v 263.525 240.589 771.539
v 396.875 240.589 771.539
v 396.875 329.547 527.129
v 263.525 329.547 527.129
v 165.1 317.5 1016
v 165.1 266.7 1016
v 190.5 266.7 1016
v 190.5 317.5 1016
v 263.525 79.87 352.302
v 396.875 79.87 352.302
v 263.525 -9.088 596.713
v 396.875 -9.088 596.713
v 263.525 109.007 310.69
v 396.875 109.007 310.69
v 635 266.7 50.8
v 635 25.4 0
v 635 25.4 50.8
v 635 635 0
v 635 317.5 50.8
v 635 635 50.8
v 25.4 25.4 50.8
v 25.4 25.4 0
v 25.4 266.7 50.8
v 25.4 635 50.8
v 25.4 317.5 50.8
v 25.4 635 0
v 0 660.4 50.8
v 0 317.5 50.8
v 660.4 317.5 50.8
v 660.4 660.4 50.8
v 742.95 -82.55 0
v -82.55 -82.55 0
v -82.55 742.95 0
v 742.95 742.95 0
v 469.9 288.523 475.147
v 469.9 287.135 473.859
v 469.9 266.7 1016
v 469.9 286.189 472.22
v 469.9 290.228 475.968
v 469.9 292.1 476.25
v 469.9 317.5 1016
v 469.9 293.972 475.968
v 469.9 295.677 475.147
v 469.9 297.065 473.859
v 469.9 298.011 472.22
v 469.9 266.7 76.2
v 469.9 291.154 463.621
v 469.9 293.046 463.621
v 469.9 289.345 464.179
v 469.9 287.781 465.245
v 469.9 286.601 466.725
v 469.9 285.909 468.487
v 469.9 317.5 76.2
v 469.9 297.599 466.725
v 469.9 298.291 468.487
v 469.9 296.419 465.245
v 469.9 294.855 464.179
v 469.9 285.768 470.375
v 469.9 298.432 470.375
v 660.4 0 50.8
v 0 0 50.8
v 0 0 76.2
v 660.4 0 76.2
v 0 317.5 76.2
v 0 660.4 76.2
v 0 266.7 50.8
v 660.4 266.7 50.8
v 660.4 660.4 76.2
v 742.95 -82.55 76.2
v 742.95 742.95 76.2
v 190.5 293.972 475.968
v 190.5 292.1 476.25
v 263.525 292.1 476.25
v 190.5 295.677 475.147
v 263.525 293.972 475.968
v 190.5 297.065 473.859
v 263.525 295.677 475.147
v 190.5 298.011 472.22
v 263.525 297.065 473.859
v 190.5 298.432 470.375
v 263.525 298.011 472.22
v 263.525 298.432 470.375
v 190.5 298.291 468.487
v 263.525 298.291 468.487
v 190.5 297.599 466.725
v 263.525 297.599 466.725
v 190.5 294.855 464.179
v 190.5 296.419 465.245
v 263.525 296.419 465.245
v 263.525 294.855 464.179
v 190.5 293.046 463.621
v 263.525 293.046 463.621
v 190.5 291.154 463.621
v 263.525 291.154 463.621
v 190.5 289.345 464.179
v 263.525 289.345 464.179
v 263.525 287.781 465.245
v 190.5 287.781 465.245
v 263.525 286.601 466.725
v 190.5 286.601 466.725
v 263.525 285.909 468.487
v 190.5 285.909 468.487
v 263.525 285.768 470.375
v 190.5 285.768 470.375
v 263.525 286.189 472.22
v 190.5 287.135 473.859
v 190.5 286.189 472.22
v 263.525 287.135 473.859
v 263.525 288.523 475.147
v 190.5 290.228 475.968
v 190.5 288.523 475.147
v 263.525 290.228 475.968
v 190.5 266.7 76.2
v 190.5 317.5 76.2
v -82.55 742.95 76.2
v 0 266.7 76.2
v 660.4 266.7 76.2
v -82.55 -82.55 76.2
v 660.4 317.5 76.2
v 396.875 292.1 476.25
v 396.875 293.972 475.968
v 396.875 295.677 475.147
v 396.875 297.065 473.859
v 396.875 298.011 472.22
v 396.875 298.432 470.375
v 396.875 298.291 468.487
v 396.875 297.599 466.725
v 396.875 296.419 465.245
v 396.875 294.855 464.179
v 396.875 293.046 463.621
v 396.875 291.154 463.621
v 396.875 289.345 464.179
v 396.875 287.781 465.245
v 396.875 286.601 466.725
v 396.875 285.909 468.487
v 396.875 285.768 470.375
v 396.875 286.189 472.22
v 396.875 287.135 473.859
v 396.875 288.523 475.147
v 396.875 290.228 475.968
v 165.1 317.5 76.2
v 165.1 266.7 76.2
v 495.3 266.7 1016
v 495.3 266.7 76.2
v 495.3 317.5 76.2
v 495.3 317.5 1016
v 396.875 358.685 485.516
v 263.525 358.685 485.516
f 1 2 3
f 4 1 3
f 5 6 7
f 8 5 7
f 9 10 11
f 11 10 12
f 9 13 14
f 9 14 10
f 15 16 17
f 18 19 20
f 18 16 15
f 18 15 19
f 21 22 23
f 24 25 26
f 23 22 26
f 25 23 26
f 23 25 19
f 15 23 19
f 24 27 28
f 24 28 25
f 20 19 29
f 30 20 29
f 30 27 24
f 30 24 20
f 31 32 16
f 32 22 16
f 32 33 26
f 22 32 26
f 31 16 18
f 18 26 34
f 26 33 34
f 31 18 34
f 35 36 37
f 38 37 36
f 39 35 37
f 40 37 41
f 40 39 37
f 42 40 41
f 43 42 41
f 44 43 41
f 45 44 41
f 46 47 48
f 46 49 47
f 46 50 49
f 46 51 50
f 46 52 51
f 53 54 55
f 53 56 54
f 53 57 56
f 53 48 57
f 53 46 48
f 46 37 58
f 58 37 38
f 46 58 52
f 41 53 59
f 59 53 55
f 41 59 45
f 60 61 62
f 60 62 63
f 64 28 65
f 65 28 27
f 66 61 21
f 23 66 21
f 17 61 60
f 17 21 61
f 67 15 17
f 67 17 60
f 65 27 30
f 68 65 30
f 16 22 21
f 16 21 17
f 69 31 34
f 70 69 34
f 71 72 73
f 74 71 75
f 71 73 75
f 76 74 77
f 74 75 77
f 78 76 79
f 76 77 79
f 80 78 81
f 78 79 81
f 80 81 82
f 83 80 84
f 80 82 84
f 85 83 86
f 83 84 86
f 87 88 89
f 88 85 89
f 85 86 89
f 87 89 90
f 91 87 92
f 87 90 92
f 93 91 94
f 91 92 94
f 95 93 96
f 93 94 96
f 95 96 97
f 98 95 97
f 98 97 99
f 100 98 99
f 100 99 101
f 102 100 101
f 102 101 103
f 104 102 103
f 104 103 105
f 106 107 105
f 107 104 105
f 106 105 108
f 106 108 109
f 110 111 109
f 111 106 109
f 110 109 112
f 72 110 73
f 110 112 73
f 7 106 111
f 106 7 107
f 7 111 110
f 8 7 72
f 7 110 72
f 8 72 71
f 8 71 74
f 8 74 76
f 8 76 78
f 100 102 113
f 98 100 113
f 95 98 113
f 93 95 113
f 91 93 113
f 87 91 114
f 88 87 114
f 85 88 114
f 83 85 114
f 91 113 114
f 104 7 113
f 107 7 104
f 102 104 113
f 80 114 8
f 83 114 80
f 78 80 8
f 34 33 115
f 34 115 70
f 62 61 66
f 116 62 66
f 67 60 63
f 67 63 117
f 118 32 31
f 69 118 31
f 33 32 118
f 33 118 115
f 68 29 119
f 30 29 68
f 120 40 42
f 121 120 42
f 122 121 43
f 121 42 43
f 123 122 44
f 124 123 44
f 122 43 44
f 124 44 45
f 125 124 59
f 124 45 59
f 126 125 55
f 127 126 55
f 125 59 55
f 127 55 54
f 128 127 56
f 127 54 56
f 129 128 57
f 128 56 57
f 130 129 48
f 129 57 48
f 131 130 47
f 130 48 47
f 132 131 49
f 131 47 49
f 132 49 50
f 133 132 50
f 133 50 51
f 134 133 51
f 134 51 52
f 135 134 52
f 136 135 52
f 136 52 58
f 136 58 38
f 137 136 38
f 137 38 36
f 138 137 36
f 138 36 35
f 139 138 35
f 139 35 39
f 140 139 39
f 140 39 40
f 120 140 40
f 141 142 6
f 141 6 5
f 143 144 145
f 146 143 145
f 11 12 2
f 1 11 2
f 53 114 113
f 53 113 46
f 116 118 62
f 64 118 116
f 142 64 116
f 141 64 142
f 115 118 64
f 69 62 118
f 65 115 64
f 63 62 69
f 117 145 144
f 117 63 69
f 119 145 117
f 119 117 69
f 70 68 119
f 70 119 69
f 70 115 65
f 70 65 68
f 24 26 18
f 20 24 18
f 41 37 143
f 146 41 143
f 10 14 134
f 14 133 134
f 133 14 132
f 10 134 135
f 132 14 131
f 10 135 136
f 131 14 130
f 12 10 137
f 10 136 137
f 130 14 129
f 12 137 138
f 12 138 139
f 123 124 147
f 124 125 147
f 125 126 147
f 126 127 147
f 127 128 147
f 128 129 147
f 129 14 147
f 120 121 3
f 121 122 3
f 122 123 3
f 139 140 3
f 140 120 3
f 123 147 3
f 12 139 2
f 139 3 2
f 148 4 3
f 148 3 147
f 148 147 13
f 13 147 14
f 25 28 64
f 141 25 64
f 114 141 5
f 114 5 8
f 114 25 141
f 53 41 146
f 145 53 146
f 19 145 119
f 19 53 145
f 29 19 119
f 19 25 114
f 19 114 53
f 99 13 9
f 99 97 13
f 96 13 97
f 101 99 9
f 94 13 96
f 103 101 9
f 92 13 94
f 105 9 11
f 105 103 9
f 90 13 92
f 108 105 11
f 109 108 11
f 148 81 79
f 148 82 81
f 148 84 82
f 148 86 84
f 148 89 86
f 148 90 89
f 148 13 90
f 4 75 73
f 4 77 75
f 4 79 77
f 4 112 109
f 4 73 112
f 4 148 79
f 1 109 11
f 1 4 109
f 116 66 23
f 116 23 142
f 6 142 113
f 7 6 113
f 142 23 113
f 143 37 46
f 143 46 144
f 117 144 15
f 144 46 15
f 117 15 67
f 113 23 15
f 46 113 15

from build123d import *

# Parameters (mm, degrees)
SKETCH1_W           = 660.4
SKETCH1_H           = 660.4
SKETCH1_W_2         = 609.6
SKETCH1_H_2         = 609.6
BOSS_EXTRUDE1_DEPTH = 50.8
SKETCH2_W           = 660.4
SKETCH2_H           = 50.8
BOSS_EXTRUDE2_DEPTH = 25.4
SKETCH3_W           = 25.4
SKETCH3_H           = 50.8
BOSS_EXTRUDE3_DEPTH = 939.8
BOSS_EXTRUDE4_START = 73.025
SKETCH4_R           = 6.35
BOSS_EXTRUDE4_DEPTH = 133.35
SKETCH4_2_R         = 6.35
BOSS_EXTRUDE5_DEPTH = 282.956
SKETCH5_W           = 825.5
SKETCH5_H           = 825.5
SKETCH5_W_2         = 660.4
SKETCH5_H_2         = 660.4
BOSS_EXTRUDE6_DEPTH = 76.2


with BuildPart() as part:
    # Sketch1 → Boss-Extrude1 (new body)
    with BuildSketch(Plane.XY):
        with Locations((330.2, 330.2)):
            Rectangle(SKETCH1_W, SKETCH1_H)
        with Locations((330.2, 330.2)):
            Rectangle(SKETCH1_W_2, SKETCH1_H_2, mode=Mode.SUBTRACT)
    extrude(amount=BOSS_EXTRUDE1_DEPTH)

    # Sketch2 → Boss-Extrude2 (add)
    with BuildSketch(Plane.XY.offset(50.8)):
        with Locations((330.2, 292.1)):
            Rectangle(SKETCH2_W, SKETCH2_H)
    extrude(amount=BOSS_EXTRUDE2_DEPTH)

    # Sketch3 → Boss-Extrude3 (add)
    with BuildSketch(Plane.XY.offset(76.2)):
        with Locations((177.8, 292.1)):
            Rectangle(SKETCH3_W, SKETCH3_H)
        with Locations((482.6, 292.1)):
            Rectangle(SKETCH3_W, SKETCH3_H)
    extrude(amount=BOSS_EXTRUDE3_DEPTH)



with BuildPart() as body_2:
    # Sketch4 → Boss-Extrude4 (new body)
    with BuildSketch(Plane.ZY.offset(-469.9).offset(BOSS_EXTRUDE4_START)):
        Polygon((485.515641783, 358.684996296), (310.689543984, 109.007453196), (352.302467833, 79.86977023), (596.712759729, -9.088300969), (771.538857529, 240.589242131), (527.128565633, 329.547313329), align=None)
        with Locations((469.9, 292.1)):
            Circle(SKETCH4_R, mode=Mode.SUBTRACT)
    extrude(amount=BOSS_EXTRUDE4_DEPTH)


with BuildPart() as part_1:
    add(part.part)

    add(body_2.part)  # Boss-Extrude5 merges body 2
    # Sketch4<2> → Boss-Extrude5 (add)
    with BuildSketch(Plane.ZY.offset(-469.9)):
        with Locations((469.9, 292.1)):
            Circle(SKETCH4_2_R)
    extrude(amount=BOSS_EXTRUDE5_DEPTH)

    # Sketch5 → Boss-Extrude6 (add)
    with BuildSketch(Plane.XY):
        with Locations((330.2, 330.2)):
            Rectangle(SKETCH5_W, SKETCH5_H)
        with Locations((330.2, 330.2)):
            Rectangle(SKETCH5_W_2, SKETCH5_H_2, mode=Mode.SUBTRACT)
    extrude(amount=BOSS_EXTRUDE6_DEPTH)


solid = part_1.part
